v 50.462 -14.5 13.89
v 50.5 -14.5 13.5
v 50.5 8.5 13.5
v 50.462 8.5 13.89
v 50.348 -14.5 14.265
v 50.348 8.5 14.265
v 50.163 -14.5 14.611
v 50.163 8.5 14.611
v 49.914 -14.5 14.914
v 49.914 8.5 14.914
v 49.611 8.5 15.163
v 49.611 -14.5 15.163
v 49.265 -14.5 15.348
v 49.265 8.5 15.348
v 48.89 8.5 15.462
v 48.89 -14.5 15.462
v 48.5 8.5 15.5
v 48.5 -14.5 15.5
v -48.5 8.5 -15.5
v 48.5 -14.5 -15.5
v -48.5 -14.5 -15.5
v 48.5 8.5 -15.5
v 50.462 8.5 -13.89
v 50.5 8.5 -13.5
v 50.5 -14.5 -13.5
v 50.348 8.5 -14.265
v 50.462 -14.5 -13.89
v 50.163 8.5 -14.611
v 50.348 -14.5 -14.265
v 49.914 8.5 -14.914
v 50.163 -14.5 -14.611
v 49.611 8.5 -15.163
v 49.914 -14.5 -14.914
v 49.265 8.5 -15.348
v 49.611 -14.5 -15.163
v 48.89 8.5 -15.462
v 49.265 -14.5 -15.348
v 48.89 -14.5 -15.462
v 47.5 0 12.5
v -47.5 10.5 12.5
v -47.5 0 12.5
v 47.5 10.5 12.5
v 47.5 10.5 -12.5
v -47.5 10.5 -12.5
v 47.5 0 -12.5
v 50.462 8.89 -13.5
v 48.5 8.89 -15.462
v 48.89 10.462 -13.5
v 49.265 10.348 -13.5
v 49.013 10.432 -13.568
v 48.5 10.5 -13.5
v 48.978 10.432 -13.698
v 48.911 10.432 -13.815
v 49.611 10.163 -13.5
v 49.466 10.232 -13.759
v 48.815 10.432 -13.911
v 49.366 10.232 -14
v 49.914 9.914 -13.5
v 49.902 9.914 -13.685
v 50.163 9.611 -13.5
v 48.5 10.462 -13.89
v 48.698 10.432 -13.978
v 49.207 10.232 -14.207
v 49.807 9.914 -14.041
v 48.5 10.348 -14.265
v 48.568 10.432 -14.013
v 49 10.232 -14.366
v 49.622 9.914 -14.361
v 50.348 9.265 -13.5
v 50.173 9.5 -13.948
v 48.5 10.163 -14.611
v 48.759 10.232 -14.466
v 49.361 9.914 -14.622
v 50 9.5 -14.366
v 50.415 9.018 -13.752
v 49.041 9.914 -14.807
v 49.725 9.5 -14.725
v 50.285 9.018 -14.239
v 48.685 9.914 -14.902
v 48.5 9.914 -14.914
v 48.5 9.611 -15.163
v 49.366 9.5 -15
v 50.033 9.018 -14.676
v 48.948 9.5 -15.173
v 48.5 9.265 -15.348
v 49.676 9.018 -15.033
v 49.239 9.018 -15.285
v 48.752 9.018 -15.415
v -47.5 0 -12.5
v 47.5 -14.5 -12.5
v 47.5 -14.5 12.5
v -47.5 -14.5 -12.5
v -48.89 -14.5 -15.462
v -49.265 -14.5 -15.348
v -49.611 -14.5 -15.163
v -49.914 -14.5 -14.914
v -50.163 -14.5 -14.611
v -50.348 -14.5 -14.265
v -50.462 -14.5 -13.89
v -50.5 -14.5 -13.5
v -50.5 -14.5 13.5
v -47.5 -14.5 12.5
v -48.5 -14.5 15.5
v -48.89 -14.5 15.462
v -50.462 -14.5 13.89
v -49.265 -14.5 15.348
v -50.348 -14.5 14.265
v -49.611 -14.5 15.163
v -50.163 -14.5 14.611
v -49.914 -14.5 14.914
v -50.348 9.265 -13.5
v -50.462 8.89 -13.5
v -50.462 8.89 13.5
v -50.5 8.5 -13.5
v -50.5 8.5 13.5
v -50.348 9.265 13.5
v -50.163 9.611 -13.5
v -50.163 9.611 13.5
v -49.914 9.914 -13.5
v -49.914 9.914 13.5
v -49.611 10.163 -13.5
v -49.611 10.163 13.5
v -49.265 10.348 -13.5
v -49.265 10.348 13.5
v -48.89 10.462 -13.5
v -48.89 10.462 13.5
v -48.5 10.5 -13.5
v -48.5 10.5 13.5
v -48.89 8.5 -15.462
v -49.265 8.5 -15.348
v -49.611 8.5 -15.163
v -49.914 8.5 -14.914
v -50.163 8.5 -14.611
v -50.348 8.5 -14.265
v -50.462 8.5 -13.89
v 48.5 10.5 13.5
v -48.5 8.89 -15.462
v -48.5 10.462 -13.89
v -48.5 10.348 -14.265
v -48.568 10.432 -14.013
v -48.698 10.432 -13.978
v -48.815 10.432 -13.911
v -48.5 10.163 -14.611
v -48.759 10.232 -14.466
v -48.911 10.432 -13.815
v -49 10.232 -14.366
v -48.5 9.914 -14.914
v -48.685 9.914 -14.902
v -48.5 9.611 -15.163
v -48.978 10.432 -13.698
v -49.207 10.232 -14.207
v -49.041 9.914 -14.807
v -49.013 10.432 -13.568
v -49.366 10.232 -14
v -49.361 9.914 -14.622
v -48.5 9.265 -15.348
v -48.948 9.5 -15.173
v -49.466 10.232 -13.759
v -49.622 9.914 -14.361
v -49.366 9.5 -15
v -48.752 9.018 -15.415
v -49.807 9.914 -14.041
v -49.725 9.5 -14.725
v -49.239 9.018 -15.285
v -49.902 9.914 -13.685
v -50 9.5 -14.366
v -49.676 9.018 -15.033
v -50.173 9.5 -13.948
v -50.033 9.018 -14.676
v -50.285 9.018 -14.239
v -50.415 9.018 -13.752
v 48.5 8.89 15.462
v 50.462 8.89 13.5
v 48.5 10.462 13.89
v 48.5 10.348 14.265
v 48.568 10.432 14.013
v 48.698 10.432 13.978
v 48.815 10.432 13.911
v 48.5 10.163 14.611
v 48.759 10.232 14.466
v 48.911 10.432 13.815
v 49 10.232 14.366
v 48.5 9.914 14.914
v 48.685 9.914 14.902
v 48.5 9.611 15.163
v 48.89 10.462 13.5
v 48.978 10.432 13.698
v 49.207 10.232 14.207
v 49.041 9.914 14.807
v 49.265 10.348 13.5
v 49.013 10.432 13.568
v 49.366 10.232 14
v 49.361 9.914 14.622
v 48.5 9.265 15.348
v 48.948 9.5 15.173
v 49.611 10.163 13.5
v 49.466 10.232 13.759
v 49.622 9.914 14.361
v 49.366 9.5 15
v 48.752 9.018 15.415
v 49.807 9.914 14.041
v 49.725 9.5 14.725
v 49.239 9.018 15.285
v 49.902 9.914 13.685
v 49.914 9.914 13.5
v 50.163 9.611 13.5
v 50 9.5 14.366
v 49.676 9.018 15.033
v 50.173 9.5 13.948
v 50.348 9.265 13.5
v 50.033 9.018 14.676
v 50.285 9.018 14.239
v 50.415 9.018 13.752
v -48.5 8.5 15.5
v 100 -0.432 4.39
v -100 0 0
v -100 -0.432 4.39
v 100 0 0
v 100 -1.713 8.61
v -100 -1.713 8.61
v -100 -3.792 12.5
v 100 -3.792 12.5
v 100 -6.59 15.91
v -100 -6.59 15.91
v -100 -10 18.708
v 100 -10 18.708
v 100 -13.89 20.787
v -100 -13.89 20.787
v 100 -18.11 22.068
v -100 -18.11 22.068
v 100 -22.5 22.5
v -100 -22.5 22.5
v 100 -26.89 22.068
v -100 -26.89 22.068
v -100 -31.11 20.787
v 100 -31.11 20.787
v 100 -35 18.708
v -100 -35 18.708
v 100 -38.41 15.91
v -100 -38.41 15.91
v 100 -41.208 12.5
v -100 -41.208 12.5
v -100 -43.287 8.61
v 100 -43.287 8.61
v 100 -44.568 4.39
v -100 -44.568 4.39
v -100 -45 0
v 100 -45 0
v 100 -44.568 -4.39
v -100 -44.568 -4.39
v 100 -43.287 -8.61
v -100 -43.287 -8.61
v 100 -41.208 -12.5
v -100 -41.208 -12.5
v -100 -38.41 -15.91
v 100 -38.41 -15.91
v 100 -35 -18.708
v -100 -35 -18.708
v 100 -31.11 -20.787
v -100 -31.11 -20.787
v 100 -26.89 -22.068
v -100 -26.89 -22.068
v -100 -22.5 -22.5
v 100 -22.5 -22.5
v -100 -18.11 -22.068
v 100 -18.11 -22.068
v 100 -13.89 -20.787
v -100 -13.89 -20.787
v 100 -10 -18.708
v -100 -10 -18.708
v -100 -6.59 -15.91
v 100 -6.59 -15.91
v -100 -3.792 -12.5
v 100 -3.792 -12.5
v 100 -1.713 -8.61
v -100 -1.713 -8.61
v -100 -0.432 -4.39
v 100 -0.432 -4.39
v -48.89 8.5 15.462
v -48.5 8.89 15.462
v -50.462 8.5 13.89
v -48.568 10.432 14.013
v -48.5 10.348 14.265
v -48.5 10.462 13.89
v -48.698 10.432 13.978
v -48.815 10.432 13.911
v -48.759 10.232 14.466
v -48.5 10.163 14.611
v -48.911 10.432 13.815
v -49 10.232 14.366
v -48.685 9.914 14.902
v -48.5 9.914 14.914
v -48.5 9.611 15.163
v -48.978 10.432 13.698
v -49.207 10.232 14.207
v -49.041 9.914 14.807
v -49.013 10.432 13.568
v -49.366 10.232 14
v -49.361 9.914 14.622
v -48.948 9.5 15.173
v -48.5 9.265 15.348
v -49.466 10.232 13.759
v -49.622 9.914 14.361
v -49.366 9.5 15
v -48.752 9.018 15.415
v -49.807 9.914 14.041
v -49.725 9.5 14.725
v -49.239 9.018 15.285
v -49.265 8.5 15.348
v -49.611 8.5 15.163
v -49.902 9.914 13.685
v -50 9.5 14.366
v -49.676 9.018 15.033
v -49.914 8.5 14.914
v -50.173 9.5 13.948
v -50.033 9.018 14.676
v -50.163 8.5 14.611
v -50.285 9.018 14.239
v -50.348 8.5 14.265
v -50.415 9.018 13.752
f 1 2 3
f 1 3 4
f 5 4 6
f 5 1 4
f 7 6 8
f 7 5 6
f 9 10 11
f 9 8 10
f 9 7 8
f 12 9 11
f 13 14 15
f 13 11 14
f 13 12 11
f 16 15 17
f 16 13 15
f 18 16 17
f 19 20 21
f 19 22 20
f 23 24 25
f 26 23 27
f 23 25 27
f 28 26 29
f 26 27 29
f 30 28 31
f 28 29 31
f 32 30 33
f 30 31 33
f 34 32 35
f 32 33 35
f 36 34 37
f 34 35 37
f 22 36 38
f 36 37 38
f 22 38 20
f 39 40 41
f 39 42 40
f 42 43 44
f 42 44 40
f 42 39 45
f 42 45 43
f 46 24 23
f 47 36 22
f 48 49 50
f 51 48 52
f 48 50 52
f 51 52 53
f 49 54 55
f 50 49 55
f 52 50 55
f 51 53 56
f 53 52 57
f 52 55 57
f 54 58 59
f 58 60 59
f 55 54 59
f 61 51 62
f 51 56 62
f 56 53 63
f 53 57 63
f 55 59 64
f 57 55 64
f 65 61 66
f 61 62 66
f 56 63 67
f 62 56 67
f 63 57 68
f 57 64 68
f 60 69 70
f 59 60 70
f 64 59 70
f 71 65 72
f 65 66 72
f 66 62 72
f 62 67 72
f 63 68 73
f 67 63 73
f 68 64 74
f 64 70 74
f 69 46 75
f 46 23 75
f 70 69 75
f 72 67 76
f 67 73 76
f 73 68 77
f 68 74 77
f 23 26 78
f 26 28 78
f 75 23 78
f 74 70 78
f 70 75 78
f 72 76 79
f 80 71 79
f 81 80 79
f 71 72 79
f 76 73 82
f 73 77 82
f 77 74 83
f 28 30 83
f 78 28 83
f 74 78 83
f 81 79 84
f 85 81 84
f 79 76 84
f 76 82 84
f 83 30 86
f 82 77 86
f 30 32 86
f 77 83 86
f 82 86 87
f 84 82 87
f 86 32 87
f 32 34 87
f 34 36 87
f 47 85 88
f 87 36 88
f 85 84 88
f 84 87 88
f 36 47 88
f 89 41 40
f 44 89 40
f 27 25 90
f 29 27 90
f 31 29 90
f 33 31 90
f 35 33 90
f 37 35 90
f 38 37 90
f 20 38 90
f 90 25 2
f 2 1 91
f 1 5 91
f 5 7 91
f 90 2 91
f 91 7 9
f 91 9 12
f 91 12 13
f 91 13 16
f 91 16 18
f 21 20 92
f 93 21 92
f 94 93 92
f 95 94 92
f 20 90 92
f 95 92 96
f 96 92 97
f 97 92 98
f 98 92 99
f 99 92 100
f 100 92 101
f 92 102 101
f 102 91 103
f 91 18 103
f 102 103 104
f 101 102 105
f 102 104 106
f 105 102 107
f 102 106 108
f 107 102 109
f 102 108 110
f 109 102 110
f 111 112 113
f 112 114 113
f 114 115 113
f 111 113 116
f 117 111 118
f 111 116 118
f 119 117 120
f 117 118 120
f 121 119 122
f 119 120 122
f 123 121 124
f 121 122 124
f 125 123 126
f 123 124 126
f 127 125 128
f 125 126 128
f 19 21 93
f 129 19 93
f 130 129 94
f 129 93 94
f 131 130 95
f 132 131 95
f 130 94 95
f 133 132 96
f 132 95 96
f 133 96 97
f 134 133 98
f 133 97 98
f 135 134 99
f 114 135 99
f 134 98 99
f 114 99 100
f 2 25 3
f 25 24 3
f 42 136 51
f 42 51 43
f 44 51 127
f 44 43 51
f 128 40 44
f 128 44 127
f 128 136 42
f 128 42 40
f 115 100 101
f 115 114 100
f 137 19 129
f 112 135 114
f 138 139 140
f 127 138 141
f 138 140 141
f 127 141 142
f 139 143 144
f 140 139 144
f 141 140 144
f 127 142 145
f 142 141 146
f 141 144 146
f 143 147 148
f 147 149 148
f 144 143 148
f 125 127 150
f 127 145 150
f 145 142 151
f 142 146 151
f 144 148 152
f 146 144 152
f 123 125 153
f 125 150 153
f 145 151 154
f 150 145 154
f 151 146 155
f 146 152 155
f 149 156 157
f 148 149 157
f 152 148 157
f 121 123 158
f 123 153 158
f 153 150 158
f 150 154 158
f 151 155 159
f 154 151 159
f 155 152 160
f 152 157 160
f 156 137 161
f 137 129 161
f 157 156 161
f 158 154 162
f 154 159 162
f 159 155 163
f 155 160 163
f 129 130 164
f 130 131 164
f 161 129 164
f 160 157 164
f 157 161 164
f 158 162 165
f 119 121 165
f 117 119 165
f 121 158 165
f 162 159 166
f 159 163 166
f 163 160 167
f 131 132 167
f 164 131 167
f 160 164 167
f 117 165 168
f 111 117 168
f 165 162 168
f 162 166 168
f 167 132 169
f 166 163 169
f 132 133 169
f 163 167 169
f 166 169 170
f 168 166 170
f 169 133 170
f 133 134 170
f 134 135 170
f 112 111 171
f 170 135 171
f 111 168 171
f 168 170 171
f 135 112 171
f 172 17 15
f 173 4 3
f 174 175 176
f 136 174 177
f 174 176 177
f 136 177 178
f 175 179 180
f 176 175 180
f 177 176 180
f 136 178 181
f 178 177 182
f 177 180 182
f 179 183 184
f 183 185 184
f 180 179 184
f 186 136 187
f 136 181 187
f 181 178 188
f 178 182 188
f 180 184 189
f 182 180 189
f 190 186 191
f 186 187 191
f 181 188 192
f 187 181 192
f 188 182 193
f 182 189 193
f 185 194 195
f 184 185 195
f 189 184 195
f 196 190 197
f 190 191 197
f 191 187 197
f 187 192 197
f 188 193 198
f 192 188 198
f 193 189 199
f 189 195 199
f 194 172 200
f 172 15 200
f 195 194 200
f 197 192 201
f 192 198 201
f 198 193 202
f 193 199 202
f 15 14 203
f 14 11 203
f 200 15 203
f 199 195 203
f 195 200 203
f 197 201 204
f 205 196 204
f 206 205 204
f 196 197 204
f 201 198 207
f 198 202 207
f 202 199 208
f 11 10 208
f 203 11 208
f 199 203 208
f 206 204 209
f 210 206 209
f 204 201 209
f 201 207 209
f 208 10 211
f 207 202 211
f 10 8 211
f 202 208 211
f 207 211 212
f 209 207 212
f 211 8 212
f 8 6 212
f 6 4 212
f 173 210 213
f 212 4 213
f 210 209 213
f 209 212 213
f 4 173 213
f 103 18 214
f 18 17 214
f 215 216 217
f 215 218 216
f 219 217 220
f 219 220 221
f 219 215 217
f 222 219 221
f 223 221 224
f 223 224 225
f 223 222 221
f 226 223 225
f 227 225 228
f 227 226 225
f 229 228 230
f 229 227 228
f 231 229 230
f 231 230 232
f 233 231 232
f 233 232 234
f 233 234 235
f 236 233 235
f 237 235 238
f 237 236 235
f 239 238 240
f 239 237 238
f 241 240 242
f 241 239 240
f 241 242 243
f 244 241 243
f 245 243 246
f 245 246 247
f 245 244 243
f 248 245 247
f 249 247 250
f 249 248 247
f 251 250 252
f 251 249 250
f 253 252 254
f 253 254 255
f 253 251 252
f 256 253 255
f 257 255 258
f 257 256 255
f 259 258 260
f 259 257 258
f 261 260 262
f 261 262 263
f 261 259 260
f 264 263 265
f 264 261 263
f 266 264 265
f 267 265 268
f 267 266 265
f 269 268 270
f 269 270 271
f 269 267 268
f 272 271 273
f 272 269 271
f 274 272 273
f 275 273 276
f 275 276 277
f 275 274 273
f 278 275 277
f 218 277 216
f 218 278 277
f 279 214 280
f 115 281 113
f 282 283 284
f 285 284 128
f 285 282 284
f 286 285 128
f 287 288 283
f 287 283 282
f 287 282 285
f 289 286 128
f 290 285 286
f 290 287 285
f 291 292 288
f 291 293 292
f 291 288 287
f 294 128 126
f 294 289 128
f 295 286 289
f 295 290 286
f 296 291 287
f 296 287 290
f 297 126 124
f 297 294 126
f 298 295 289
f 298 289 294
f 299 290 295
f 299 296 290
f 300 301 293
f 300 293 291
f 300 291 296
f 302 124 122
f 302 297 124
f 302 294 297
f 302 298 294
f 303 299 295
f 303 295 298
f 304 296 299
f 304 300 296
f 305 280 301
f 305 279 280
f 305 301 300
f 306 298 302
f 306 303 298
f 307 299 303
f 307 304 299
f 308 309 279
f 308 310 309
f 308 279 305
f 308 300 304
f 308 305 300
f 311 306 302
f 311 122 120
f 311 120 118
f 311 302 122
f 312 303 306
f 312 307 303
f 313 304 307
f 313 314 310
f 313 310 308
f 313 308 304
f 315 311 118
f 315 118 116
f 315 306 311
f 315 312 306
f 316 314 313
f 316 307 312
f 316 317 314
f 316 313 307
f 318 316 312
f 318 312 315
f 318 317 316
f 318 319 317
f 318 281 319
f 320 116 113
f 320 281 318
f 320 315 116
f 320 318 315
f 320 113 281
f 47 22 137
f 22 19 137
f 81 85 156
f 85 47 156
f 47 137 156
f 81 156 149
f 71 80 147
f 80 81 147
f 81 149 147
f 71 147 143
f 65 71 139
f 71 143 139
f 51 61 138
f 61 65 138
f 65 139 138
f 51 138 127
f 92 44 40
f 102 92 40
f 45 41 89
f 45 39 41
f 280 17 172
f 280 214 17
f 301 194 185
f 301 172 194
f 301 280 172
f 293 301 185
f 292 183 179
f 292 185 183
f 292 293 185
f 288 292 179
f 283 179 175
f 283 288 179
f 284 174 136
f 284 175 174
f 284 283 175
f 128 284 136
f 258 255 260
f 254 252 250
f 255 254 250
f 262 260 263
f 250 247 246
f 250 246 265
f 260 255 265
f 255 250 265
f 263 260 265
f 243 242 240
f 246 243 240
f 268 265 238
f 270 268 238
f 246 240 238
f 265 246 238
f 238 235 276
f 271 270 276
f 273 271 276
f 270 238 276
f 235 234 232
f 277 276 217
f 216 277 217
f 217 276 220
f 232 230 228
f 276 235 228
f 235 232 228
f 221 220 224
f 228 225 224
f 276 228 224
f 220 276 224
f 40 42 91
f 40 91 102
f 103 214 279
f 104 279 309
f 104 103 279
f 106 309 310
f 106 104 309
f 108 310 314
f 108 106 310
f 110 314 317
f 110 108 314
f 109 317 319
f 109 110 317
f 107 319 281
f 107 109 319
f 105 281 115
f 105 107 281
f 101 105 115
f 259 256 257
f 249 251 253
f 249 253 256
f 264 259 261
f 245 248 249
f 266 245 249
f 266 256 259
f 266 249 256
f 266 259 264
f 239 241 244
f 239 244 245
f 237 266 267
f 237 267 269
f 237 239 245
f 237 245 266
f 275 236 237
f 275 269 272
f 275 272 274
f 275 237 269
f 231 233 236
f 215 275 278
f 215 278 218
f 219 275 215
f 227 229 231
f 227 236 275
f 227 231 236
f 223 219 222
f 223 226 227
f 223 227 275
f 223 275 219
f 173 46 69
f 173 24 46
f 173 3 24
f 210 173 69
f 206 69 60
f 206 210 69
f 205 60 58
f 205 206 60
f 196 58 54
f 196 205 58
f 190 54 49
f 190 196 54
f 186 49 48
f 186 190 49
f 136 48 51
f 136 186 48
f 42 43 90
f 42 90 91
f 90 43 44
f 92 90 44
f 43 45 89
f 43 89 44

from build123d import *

# Parameters (mm, degrees)
F0_R     = 22.5
F1_DEPTH = 100
F2_DEPTH = 47.5
F3_W     = 101
F3_H     = 31
F3_W_2   = 95
F3_H_2   = 25
F4_DEPTH = 25
F5_R     = 2


with BuildPart() as f1:
    # F0 (on Right) → F1 (new body, symmetric)
    with BuildSketch(Plane.YZ):
        with Locations((-22.5, 0)):
            Circle(F0_R)
    extrude(amount=F1_DEPTH, both=True)


with BuildPart() as f2:
    # F0 (on Right) → F2 (new body, symmetric)
    with BuildSketch(Plane.YZ):
        Polygon((0, 12.5), (0, 0), (0, -12.5), (10.5, -12.5), (10.5, 12.5), align=None)
    extrude(amount=F2_DEPTH, both=True)


with BuildPart() as f4:
    # F3 (on face) → F4 (new body)
    with BuildSketch(Plane(origin=(0, 10.5, 0), x_dir=(-1, 0, 0), z_dir=(0, 1, 0))):
        Rectangle(F3_W, F3_H)
        Rectangle(F3_W_2, F3_H_2, mode=Mode.SUBTRACT)
    extrude(amount=-F4_DEPTH)

    # F5
    f5_edges = [f4.edges().sort_by_distance(p)[0] for p in [
        (50.5, -2, 15.5),
        (50.5, -2, -15.5),
        (-50.5, -2, 15.5),
        (-50.5, -2, -15.5),
        (0, 10.5, 15.5),
        (50.5, 10.5, 0),
        (0, 10.5, -15.5),
        (-50.5, 10.5, 0),
    ]]
    fillet(f5_edges, radius=F5_R)


solid = Compound([f1.part, f2.part, f4.part])
